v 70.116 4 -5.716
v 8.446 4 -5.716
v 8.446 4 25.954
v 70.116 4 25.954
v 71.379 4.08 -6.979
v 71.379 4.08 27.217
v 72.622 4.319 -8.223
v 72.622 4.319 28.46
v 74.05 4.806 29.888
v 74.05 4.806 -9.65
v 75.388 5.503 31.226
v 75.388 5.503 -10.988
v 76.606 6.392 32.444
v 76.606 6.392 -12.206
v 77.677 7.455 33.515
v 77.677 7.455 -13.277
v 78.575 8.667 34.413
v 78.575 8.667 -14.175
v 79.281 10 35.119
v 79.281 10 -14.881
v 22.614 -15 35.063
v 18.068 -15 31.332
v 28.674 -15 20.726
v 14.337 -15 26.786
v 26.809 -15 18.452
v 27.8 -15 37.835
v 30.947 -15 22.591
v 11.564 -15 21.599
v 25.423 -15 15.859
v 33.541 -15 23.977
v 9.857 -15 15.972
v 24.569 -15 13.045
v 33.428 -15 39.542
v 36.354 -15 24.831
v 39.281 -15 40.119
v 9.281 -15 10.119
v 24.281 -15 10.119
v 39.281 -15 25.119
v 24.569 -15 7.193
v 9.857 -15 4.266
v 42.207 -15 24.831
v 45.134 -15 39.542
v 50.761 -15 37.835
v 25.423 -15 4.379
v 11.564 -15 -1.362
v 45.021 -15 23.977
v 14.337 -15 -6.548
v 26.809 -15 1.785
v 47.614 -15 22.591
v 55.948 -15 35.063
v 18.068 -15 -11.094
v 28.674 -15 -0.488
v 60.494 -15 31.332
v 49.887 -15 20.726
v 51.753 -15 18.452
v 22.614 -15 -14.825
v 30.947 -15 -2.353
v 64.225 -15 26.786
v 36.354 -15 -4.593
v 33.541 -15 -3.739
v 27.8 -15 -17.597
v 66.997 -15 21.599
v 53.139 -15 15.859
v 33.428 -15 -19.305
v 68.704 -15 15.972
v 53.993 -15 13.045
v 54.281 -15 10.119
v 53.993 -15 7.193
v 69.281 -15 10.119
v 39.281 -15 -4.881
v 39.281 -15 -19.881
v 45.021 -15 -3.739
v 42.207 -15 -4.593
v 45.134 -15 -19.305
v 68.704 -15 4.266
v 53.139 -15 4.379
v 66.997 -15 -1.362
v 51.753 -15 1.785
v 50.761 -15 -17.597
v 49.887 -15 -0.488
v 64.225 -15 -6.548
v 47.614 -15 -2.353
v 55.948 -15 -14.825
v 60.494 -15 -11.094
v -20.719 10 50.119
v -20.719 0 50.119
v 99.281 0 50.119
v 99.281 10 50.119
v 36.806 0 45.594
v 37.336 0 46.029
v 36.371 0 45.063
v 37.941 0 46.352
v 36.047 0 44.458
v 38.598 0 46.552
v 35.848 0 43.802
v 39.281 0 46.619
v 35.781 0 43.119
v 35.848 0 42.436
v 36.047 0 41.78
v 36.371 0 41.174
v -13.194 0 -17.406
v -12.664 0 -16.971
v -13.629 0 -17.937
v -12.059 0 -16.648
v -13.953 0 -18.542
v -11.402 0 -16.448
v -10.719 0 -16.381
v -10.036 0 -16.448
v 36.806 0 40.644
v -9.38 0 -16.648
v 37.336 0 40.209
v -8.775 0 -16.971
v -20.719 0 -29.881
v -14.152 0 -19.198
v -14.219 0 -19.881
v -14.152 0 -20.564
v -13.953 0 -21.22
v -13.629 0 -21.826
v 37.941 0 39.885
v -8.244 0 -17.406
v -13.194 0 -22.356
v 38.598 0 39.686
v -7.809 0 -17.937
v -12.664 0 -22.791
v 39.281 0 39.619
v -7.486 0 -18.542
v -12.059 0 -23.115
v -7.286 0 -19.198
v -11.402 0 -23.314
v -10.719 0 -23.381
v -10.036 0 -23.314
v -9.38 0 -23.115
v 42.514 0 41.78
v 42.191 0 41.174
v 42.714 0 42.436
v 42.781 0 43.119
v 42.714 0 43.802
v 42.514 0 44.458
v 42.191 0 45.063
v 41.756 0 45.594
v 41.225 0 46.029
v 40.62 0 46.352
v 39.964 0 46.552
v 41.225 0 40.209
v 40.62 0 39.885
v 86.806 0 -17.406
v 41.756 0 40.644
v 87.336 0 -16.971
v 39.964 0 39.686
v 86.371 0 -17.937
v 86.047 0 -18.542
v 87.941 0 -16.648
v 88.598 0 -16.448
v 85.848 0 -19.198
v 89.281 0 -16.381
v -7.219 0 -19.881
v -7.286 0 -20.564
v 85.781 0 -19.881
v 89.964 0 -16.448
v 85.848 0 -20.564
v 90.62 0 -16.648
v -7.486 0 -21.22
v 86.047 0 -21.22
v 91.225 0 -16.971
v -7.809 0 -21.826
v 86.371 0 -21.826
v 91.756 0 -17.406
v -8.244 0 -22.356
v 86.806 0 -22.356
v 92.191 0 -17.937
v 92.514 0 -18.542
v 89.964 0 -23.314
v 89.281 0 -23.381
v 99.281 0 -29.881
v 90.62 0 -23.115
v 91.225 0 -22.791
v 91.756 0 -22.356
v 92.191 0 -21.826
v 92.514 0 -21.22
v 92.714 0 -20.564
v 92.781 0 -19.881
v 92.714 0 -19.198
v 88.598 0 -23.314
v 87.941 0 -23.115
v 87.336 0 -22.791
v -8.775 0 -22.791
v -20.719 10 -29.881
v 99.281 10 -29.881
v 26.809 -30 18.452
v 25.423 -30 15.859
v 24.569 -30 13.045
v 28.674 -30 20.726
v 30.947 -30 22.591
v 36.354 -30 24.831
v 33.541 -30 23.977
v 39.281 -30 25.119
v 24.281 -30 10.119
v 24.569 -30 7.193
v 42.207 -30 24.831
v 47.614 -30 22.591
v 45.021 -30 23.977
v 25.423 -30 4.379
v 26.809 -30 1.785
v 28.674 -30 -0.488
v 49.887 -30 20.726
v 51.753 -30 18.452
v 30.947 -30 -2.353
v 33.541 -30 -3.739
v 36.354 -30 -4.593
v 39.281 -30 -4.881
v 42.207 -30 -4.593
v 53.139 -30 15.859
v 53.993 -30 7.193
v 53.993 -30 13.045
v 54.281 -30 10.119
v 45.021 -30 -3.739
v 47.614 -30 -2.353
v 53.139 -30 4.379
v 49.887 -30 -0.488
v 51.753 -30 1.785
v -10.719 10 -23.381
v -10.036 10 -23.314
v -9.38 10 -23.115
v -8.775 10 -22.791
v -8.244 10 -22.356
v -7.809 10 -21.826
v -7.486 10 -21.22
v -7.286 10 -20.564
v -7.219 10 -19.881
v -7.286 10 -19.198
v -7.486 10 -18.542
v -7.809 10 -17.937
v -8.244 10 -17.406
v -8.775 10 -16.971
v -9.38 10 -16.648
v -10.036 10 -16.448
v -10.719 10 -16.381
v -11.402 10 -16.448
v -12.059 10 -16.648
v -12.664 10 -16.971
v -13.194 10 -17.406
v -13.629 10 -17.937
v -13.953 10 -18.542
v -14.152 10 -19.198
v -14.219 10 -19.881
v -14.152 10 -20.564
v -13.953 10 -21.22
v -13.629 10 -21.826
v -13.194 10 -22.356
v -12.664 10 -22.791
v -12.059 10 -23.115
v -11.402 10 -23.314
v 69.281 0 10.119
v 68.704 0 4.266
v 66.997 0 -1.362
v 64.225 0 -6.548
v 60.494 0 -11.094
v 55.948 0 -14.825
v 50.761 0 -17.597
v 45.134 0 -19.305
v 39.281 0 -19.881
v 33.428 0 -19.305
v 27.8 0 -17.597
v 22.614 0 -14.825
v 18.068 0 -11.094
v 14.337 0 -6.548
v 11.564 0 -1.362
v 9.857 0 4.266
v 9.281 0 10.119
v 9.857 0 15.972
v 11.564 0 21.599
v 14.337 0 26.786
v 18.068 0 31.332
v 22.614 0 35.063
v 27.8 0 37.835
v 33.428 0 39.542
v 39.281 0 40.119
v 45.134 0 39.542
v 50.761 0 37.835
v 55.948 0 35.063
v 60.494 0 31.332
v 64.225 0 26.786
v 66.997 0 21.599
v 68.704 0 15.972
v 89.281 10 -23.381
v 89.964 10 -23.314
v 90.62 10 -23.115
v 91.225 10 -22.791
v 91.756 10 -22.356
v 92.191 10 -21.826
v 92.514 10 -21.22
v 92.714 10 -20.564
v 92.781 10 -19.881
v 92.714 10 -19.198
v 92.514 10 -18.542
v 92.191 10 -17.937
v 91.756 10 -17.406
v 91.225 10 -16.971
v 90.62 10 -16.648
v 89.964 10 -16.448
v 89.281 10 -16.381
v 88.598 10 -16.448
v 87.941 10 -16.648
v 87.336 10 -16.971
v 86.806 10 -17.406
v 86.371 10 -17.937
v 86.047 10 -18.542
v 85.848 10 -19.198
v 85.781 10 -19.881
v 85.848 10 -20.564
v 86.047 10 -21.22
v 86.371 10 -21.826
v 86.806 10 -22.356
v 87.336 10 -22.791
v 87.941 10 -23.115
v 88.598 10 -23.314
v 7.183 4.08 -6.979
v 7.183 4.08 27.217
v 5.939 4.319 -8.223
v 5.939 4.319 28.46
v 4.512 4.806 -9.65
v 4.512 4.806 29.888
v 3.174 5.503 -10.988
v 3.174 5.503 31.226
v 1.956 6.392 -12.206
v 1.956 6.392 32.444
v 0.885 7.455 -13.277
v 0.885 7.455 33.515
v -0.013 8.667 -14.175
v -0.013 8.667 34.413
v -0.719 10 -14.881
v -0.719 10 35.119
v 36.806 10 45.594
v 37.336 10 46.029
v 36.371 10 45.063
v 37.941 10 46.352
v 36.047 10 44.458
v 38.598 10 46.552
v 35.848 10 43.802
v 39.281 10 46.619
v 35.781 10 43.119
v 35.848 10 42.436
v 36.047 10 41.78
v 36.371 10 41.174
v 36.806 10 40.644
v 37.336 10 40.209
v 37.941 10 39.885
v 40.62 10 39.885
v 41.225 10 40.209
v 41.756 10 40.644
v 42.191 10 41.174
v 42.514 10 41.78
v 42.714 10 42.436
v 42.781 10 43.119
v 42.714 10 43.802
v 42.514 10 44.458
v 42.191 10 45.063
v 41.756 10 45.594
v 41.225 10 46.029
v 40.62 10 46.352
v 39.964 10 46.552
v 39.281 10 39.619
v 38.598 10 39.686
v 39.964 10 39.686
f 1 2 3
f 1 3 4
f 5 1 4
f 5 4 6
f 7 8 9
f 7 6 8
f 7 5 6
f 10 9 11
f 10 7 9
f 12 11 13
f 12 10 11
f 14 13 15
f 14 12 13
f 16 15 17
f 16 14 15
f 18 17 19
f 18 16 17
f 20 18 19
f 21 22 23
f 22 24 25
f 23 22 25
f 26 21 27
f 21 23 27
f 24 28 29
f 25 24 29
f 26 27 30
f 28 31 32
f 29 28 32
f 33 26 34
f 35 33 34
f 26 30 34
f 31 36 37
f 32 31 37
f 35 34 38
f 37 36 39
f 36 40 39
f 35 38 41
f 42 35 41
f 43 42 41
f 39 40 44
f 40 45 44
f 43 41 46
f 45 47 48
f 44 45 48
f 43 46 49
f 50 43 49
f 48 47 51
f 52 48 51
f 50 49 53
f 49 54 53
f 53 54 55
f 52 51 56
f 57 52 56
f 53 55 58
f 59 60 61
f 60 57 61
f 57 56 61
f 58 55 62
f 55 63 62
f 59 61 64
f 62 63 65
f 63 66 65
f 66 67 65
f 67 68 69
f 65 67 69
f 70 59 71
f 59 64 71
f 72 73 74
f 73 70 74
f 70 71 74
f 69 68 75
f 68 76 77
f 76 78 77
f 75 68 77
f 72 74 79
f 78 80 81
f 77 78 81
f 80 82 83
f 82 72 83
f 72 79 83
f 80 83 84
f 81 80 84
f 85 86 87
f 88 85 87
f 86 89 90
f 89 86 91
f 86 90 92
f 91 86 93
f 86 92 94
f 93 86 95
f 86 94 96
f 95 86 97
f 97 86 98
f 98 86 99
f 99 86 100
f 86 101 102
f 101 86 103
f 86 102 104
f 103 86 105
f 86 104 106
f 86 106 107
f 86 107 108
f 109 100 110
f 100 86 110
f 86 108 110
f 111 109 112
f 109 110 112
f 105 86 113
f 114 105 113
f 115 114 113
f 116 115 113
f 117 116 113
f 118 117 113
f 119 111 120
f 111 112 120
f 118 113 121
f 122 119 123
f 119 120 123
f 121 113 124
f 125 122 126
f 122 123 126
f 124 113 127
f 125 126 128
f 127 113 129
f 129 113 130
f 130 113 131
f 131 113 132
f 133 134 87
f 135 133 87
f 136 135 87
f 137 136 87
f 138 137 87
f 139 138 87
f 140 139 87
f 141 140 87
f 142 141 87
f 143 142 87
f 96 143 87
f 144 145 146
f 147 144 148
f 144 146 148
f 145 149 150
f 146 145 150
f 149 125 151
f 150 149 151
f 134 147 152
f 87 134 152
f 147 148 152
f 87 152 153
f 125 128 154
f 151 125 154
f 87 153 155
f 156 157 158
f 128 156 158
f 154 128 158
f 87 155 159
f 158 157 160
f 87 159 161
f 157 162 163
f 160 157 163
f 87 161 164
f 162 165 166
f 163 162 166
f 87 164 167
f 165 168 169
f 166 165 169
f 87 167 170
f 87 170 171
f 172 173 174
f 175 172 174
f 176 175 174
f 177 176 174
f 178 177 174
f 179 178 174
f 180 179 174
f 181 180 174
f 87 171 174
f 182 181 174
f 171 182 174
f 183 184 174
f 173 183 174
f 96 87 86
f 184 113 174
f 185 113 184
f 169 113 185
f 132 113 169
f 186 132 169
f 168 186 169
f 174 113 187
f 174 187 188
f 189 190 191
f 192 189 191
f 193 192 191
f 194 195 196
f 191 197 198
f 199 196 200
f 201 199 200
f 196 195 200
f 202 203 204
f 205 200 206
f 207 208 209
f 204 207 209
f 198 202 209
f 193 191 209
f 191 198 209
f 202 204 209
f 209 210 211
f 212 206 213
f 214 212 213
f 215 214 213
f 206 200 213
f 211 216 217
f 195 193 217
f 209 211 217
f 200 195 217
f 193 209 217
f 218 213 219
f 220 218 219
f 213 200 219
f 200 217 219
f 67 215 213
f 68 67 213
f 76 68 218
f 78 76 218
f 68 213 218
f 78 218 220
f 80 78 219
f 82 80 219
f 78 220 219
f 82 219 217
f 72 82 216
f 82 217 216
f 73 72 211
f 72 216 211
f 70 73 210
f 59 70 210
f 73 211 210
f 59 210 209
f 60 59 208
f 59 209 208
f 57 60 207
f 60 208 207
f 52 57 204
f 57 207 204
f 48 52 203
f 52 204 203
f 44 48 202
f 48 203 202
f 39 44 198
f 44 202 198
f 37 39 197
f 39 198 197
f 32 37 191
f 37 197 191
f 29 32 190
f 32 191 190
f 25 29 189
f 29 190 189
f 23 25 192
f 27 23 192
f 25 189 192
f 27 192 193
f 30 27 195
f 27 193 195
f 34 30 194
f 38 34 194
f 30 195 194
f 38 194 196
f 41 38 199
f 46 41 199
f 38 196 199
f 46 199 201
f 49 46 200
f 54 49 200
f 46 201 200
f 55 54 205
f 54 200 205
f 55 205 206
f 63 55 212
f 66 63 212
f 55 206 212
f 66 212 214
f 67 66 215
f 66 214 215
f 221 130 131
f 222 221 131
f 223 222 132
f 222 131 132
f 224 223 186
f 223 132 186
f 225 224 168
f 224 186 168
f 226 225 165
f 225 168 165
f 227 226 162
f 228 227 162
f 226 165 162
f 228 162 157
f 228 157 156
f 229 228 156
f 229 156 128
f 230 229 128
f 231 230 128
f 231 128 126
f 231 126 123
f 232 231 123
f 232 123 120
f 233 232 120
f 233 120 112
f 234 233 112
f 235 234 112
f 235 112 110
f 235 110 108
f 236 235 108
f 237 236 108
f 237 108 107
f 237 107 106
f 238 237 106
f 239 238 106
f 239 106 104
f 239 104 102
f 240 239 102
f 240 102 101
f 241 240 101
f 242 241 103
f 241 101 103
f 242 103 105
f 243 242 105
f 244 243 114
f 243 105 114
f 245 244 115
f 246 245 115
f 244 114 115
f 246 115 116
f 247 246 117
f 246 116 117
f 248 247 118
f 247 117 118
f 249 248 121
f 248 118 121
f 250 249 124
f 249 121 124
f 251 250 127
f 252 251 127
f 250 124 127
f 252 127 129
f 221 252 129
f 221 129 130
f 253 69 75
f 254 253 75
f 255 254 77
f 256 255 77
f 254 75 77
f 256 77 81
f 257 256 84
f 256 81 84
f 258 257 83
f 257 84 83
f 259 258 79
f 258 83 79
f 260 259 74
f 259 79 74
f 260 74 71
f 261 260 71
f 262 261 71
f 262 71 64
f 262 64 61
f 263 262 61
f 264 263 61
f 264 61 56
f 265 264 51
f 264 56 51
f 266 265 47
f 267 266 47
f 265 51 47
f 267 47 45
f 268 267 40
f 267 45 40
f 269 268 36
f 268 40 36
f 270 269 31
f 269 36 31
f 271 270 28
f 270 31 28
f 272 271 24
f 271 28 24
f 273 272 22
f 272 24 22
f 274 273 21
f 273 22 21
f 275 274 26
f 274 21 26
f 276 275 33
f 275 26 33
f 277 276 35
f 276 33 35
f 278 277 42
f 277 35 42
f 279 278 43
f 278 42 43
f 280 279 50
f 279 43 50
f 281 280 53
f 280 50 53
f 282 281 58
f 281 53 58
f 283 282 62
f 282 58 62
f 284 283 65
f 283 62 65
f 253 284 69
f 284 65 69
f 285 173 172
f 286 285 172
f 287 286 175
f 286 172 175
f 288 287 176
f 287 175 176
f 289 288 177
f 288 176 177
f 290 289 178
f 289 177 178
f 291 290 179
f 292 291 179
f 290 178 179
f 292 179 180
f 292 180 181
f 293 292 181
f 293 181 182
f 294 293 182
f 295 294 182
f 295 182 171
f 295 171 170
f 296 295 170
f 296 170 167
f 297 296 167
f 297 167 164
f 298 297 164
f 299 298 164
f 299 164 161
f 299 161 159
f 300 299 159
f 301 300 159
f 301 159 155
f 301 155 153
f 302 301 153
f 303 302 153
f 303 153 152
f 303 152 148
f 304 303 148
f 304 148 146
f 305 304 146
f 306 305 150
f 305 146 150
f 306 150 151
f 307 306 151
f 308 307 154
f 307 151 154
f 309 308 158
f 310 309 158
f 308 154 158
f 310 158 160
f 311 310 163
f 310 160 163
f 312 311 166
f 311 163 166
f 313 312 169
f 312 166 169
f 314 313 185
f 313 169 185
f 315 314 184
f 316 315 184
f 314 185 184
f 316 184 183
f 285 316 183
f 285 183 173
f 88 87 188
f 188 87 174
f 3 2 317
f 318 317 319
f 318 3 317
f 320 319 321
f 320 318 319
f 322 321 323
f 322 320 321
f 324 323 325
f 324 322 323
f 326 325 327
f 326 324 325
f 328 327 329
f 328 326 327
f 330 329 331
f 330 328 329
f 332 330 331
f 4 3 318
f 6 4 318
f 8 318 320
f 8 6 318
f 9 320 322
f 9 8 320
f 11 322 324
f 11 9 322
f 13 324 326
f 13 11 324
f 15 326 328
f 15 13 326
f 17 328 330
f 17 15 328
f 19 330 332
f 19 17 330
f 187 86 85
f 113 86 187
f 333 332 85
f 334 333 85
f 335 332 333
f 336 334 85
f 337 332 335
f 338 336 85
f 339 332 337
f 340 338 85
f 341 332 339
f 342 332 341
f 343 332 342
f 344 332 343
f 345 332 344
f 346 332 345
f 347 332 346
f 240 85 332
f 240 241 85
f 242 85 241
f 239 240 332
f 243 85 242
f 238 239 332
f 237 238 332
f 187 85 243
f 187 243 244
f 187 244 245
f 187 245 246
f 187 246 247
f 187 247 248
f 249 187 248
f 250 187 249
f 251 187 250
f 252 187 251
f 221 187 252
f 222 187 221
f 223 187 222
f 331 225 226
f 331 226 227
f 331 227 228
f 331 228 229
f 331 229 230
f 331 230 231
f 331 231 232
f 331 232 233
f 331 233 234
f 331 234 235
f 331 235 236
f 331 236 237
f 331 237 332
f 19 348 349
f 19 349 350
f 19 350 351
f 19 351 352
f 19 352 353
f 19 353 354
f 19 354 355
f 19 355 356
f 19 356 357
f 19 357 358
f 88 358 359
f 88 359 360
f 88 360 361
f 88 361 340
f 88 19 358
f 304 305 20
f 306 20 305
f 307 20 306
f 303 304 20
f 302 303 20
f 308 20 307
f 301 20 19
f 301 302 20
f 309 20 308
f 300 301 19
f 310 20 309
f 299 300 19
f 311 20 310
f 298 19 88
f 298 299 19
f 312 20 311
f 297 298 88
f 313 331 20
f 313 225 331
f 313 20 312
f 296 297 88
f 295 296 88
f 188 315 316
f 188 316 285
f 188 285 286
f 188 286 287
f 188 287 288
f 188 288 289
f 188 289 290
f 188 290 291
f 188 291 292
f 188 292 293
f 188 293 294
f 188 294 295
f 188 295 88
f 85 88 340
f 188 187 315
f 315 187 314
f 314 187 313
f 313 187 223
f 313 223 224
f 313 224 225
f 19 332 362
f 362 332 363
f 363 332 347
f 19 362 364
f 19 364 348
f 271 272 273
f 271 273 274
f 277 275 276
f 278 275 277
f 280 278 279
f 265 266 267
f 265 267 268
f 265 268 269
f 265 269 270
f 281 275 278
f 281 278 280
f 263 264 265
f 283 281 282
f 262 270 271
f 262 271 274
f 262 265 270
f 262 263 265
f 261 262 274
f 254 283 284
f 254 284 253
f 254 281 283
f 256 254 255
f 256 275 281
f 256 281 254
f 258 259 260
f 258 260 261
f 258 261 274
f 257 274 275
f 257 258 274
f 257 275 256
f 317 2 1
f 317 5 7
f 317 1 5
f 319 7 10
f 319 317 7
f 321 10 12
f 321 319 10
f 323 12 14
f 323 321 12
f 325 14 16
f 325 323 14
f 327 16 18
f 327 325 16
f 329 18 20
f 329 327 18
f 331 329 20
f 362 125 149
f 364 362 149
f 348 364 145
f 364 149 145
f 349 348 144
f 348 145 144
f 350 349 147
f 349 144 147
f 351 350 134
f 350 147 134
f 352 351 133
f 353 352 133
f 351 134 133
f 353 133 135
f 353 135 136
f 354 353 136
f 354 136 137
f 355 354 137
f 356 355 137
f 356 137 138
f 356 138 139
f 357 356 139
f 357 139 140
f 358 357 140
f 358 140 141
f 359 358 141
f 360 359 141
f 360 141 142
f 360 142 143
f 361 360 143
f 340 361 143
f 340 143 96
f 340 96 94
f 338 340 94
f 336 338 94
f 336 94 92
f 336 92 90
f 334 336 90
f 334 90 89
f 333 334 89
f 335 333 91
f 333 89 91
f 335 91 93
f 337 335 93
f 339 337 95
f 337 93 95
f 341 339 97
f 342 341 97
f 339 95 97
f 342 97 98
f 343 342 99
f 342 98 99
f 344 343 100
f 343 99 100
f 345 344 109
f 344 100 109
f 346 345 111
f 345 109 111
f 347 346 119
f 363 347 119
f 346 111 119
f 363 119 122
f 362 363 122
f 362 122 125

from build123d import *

# Parameters (mm, degrees)
SKETCH1_W             = 120
SKETCH1_H             = 80
BOSS_EXTRUDE1_DEPTH   = 10
SKETCH2_W             = 80
SKETCH2_H             = 50
CUT_EXTRUDE1_DEPTH    = 6
FILLET1_R             = 10
M8X1_0_TAPPED_HOLE2_D = 7
REVOLVE2_START        = -15
REVOLVE2_OUTLINE_R    = 30
REVOLVE2_DEPTH        = 15
REVOLVE2_START_2      = -30
REVOLVE2_2_OUTLINE_R  = 15
REVOLVE2_2_DEPTH      = 15


# Read off the part's stored shape, not the designer's step: Revolve2
with BuildPart() as part:
    # Sketch1 → Boss-Extrude1 (new body)
    with BuildSketch(Plane(origin=(0, 0, 0), x_dir=(1, 0, 0), z_dir=(0, 1, 0))):
        with Locations((39.28083641, -10.118912605)):
            Rectangle(SKETCH1_W, SKETCH1_H)
    extrude(amount=BOSS_EXTRUDE1_DEPTH)

    # Sketch2 → Cut-Extrude1 (cut)
    with BuildSketch(Plane(origin=(0, 10, 0), x_dir=(1, 0, 0), z_dir=(0, 1, 0))):
        with Locations((39.28083641, -10.118912605)):
            Rectangle(SKETCH2_W, SKETCH2_H)
    extrude(amount=-CUT_EXTRUDE1_DEPTH, mode=Mode.SUBTRACT)

    # Fillet1
    # the kernel refuses this fillet: 10 mm, written as the material it adds along each edge
    with BuildSketch(Plane(origin=(79.28083641, 4, 35.118912605), x_dir=(0, 1, 0), z_dir=(-1, 0, 0)), Plane(origin=(-0.71916359, 4, -14.881087395), x_dir=(0, 1, 0), z_dir=(1, 0, 0))) as fillet1_piece_1:
        with BuildLine():
            CenterArc((10, 9.16515139), FILLET1_R, 180, 66.421821522)
            Line((0, 9.16515139), (0, 0))
            Line((0, 0), (6, 0))
        make_face()
    extrude(amount=80)
    with BuildSketch(Plane(origin=(79.28083641, 4, -14.881087395), x_dir=(0, 1, 0), z_dir=(0, 0, 1)), Plane(origin=(-0.71916359, 4, 35.118912605), x_dir=(0, 1, 0), z_dir=(0, 0, -1))) as fillet1_piece_2:
        with BuildLine():
            CenterArc((10, 9.16515139), FILLET1_R, 180, 66.421821522)
            Line((0, 9.16515139), (0, 0))
            Line((0, 0), (6, 0))
        make_face()
    extrude(amount=50)

    # M8x1.0 Tapped Hole2 (through all)
    with Locations(Plane(origin=(-10.71916359, 10, -19.881087395), x_dir=(0, 0, 1), z_dir=(0, 1, 0))):
        with Locations((0, 0), (0, 100), (63, 50)):
            Hole(M8X1_0_TAPPED_HOLE2_D / 2)


with BuildPart() as body_2:
    # Revolve2 outline → Revolve2 (new body)
    with BuildSketch(Plane(origin=(0, 0, 0), x_dir=(1, 0, 0), z_dir=(0, 1, 0)).offset(REVOLVE2_START)):
        with Locations((39.28083641, -10.118912605)):
            Circle(REVOLVE2_OUTLINE_R)
    extrude(amount=REVOLVE2_DEPTH)

    # Revolve2 2 outline → Revolve2 2 (add)
    with BuildSketch(Plane(origin=(0, 0, 0), x_dir=(1, 0, 0), z_dir=(0, 1, 0)).offset(REVOLVE2_START_2)):
        with Locations((39.28083641, -10.118912605)):
            Circle(REVOLVE2_2_OUTLINE_R)
    extrude(amount=REVOLVE2_2_DEPTH)


solid = Compound([part.part, body_2.part])
